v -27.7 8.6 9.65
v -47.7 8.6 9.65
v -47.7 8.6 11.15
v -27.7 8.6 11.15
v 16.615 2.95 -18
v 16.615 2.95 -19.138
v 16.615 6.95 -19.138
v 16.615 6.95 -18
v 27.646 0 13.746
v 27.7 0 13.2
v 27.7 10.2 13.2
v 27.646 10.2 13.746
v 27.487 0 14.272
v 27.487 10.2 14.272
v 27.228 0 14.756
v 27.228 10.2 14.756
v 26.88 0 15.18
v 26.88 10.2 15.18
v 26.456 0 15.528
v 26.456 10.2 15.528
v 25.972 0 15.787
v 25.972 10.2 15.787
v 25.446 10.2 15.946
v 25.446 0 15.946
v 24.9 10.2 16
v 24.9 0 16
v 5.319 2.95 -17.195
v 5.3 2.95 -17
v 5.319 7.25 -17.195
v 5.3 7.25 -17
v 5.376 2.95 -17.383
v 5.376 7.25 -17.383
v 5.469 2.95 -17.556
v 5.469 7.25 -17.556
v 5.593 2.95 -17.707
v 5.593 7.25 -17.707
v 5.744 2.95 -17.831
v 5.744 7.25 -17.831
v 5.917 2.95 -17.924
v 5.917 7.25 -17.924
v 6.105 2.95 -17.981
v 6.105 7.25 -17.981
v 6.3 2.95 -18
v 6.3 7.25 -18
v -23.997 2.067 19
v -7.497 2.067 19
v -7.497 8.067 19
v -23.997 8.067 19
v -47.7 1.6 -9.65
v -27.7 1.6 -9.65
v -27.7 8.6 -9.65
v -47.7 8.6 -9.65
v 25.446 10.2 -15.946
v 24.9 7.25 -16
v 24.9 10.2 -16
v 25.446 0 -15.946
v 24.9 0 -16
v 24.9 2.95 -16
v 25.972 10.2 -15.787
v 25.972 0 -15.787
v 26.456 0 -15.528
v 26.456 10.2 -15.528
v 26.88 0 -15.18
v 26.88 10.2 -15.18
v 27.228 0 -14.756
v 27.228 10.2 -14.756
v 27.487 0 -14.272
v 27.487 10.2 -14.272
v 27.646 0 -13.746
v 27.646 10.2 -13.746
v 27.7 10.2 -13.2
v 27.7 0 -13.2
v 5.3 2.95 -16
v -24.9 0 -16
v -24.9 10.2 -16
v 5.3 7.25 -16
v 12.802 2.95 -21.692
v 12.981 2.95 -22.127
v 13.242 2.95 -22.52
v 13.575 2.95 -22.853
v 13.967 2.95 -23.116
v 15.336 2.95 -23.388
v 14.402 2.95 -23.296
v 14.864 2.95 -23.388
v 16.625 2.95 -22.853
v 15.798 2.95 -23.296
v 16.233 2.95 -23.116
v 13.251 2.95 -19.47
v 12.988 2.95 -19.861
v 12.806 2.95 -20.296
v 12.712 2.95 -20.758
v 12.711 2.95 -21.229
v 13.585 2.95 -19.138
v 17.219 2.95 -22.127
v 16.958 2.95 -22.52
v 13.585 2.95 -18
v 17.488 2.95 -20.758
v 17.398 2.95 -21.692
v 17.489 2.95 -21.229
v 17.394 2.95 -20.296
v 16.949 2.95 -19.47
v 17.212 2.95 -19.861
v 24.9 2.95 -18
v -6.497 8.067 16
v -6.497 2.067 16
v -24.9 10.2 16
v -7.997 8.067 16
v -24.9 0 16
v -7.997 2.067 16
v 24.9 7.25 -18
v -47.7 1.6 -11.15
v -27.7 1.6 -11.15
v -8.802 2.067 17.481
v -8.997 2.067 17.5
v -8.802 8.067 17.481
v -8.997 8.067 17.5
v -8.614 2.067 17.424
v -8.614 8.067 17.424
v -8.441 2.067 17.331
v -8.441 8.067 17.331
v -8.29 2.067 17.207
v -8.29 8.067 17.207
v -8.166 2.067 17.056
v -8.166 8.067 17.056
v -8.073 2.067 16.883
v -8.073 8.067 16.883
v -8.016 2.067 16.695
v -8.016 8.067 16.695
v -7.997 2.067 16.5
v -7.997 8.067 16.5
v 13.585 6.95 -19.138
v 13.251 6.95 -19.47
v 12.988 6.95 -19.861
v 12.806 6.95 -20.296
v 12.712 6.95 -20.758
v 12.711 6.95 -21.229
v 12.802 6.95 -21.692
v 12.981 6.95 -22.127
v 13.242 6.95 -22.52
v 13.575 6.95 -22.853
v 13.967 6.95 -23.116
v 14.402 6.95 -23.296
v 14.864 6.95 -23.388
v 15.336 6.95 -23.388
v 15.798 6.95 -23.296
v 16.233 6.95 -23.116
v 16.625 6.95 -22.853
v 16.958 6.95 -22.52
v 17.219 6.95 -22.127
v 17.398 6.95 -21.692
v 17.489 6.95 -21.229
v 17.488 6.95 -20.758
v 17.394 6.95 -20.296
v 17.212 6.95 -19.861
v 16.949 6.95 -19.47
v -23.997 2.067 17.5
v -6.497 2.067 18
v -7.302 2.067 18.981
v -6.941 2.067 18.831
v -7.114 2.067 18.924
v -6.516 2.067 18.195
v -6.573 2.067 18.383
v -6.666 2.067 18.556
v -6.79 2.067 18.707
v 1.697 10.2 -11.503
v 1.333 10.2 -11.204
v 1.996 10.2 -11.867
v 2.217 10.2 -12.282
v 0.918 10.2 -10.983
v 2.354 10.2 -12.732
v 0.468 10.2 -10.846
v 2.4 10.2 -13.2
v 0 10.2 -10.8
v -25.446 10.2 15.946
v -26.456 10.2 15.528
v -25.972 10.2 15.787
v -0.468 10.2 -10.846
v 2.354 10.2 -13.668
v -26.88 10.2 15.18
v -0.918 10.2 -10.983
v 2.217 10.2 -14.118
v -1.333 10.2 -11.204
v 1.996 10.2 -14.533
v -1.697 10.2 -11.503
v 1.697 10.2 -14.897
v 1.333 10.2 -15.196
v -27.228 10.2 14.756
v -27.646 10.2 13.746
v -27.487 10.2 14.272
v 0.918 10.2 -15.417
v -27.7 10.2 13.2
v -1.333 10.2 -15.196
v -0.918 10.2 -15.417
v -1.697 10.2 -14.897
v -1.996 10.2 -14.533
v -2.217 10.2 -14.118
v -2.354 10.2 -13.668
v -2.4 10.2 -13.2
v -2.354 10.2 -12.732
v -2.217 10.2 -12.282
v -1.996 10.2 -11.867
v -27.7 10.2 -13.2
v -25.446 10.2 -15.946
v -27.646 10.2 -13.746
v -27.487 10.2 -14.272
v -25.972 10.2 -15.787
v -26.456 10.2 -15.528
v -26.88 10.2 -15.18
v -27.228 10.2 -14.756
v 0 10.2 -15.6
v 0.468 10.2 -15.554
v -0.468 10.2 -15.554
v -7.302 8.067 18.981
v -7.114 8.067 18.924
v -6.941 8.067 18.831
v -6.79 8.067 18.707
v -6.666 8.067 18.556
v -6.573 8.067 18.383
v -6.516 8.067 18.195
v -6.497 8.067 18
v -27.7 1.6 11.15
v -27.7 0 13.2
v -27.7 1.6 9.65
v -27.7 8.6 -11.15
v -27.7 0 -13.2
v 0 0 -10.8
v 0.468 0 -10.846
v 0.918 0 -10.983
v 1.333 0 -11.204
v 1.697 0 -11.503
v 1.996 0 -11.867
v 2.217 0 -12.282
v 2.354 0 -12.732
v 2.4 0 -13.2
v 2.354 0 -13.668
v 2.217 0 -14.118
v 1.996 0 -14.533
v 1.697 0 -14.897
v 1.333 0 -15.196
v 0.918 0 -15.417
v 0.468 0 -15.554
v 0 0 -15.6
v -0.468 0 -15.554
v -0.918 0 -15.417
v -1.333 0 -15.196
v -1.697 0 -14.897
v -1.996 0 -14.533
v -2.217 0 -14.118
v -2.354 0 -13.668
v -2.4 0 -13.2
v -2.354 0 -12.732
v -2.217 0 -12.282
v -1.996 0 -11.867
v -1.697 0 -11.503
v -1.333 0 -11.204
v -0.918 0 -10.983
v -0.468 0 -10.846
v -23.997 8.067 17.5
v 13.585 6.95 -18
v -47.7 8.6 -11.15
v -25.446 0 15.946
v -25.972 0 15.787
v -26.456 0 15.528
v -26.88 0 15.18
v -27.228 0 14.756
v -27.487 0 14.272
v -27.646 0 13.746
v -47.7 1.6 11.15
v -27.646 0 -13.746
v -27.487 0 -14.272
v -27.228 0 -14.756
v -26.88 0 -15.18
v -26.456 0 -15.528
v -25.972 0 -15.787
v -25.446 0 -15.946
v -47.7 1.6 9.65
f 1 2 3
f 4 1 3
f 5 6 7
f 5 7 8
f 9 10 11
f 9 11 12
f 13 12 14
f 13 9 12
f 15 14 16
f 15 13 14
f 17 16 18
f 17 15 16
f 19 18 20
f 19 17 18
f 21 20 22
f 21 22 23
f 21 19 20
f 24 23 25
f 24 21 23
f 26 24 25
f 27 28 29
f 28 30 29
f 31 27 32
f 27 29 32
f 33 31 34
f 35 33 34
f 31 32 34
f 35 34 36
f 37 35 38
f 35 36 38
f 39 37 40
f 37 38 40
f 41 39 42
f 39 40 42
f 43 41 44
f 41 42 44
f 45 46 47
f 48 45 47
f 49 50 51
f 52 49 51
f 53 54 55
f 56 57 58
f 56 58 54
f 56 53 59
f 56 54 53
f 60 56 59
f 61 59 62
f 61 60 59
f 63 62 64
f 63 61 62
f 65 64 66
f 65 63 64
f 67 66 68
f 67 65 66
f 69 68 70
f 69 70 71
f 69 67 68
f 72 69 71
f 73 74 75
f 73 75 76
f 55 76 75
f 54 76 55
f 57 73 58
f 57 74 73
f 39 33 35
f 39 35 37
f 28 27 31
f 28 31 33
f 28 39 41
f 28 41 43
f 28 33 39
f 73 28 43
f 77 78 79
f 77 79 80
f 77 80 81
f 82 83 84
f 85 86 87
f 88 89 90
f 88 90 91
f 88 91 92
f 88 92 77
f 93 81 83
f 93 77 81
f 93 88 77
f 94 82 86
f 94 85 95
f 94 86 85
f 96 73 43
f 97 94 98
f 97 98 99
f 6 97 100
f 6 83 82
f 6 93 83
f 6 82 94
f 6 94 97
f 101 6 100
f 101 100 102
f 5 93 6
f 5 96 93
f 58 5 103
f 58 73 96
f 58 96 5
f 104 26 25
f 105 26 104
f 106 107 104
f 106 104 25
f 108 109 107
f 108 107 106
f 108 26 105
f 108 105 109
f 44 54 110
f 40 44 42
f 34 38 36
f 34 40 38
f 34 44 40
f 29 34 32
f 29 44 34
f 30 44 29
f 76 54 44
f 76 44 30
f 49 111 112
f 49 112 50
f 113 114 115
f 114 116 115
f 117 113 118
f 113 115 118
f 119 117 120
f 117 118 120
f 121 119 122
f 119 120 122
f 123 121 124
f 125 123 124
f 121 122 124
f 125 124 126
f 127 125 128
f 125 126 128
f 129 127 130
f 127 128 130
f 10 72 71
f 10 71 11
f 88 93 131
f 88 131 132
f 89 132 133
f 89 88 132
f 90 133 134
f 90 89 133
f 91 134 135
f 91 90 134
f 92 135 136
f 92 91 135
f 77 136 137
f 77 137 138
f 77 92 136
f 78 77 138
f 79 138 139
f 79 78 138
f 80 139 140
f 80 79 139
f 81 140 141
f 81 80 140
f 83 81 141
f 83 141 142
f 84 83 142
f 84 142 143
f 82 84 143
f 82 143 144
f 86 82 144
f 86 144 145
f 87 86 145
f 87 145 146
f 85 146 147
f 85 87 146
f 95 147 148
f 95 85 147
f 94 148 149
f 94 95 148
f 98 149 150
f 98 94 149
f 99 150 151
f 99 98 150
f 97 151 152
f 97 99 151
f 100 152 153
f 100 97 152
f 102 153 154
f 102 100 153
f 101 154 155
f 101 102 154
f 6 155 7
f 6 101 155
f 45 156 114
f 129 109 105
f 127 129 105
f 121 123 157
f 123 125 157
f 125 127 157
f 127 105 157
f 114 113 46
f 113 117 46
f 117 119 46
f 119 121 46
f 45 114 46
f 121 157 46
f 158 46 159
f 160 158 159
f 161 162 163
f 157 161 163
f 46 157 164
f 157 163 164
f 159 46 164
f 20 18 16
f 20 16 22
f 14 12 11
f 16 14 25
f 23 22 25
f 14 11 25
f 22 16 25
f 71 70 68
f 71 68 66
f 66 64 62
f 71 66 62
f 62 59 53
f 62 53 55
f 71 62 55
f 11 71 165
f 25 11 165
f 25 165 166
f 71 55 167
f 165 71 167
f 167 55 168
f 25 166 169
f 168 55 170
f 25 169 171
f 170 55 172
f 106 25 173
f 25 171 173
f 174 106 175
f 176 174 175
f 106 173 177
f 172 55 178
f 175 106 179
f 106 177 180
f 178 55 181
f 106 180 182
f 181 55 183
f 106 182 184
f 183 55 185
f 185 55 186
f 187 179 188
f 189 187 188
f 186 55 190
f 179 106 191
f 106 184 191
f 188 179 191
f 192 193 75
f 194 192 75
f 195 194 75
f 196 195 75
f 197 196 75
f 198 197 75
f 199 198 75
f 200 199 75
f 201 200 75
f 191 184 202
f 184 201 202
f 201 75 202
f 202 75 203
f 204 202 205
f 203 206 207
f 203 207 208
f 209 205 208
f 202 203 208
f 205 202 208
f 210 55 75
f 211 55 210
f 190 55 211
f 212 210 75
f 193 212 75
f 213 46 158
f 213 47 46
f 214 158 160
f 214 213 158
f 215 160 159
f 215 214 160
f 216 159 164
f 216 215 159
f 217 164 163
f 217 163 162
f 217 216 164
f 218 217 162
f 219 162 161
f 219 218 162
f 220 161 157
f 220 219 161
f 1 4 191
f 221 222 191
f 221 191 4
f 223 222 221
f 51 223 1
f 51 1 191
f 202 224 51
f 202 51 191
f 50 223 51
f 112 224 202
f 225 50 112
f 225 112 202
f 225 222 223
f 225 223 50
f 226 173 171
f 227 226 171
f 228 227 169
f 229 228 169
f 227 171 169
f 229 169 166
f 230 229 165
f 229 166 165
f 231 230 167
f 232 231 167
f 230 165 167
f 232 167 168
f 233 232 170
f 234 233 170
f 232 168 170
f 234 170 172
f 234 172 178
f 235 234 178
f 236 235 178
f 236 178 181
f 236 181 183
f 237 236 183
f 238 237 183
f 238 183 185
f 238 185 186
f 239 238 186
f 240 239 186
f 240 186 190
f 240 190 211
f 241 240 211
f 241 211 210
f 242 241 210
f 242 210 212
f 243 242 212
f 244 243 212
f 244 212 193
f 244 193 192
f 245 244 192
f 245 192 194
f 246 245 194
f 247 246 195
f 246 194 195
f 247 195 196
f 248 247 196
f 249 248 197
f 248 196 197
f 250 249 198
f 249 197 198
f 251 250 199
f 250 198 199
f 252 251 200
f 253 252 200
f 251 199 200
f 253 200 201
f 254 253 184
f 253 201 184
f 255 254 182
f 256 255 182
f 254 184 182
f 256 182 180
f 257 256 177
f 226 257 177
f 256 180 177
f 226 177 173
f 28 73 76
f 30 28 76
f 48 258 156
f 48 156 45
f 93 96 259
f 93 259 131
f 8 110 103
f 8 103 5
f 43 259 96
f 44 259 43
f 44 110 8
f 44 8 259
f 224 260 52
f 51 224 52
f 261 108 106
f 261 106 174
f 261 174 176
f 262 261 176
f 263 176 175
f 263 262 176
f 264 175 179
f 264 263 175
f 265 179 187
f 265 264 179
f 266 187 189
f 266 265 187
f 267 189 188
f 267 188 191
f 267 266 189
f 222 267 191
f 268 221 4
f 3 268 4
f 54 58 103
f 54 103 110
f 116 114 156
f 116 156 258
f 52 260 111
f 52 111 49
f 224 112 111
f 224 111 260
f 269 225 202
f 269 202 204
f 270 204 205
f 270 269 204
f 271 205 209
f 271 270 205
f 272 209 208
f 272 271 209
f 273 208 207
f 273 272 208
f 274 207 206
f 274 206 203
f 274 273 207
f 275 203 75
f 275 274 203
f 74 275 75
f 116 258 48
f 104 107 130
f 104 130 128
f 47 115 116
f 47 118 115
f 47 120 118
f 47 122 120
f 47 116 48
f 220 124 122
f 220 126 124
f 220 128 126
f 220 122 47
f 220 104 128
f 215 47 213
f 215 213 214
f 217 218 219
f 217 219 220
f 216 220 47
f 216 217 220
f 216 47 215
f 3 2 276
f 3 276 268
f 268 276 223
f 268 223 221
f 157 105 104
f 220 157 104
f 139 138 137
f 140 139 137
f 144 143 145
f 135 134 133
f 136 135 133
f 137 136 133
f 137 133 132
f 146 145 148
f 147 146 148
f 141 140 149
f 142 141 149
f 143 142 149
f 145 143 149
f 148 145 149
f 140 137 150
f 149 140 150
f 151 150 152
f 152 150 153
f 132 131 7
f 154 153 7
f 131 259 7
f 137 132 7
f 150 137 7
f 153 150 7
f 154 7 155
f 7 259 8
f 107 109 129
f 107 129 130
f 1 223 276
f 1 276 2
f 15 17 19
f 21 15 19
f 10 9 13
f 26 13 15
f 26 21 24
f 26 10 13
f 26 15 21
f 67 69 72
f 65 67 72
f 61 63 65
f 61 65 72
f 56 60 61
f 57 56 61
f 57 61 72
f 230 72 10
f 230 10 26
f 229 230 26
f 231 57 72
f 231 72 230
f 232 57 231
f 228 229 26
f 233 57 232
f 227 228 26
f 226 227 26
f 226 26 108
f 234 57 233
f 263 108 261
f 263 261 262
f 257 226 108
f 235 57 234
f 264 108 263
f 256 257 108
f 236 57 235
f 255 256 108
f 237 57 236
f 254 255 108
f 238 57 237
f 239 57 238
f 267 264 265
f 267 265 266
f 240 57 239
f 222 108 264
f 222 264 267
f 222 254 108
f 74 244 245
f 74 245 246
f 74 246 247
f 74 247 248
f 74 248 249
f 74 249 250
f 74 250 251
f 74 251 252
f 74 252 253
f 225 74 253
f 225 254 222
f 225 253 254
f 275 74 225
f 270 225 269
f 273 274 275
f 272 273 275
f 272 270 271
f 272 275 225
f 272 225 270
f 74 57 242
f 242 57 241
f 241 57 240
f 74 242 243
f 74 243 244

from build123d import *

# Parameters (mm, degrees)
BOSS_EXTRUDE2_DEPTH  = 10.2
SKETCH3_W            = 19.6
SKETCH3_H            = 4.3
BOSS_EXTRUDE3_DEPTH  = 2
FILLET3_R            = 1
SKETCH4_W            = 1.5
SKETCH4_H            = 7
BOSS_EXTRUDE4_DEPTH  = 20
SKETCH5_W            = 1.5
SKETCH5_H            = 7
BOSS_EXTRUDE5_DEPTH  = 20
SKETCH6_W            = 1.5
SKETCH6_H            = 6
BOSS_EXTRUDE7_DEPTH  = 3
SKETCH8_W            = 1.5
SKETCH8_H            = 6
BOSS_EXTRUDE8_DEPTH  = 16
FILLET4_R            = 1
FILLET5_R            = 1
BOSS_EXTRUDE10_DEPTH = 4
SKETCH12_R           = 2.4
CUT_EXTRUDE1_DEPTH   = 19


with BuildPart() as part:
    # Sketch1 → Boss-Extrude2 (new body)
    with BuildSketch(Plane(origin=(0, 0, 0), x_dir=(1, 0, 0), z_dir=(0, 1, 0))):
        with BuildLine():
            Line((-24.9, 16), (24.9, 16))
            ThreePointArc((24.9, 16), (26.879898987, 15.179898987), (27.7, 13.2))
            Line((27.7, 13.2), (27.7, -13.2))
            ThreePointArc((27.7, -13.2), (26.879898987, -15.179898987), (24.9, -16))
            Line((24.9, -16), (-24.9, -16))
            ThreePointArc((-24.9, -16), (-26.879898987, -15.179898987), (-27.7, -13.2))
            Line((-27.7, -13.2), (-27.7, 13.2))
            ThreePointArc((-27.7, 13.2), (-26.879898987, 15.179898987), (-24.9, 16))
        make_face()
    extrude(amount=BOSS_EXTRUDE2_DEPTH)

    # Sketch3 → Boss-Extrude3 (add)
    with BuildSketch(Plane(origin=(0, 0, -16), x_dir=(-1, 0, 0), z_dir=(0, 0, -1))):
        with Locations((-15.1, 5.1)):
            Rectangle(SKETCH3_W, SKETCH3_H)
    extrude(amount=BOSS_EXTRUDE3_DEPTH)

    # Fillet3
    fillet3_edges = [part.edges().sort_by_distance(p)[0] for p in [
        (5.3, 5.1, -18),
    ]]
    fillet(fillet3_edges, radius=FILLET3_R)

    # Sketch4 → Boss-Extrude4 (add)
    with BuildSketch(Plane.ZY.offset(27.7)):
        with Locations((-10.4, 5.1)):
            Rectangle(SKETCH4_W, SKETCH4_H)
    extrude(amount=BOSS_EXTRUDE4_DEPTH)

    # Sketch5 → Boss-Extrude5 (add)
    with BuildSketch(Plane.ZY.offset(27.7)):
        with Locations((10.4, 5.1)):
            Rectangle(SKETCH5_W, SKETCH5_H)
    extrude(amount=BOSS_EXTRUDE5_DEPTH)

    # Sketch6 → Boss-Extrude7 (add)
    with BuildSketch(Plane.XY.offset(16)):
        with Locations((-7.247043242, 5.066819201)):
            Rectangle(SKETCH6_W, SKETCH6_H)
    extrude(amount=BOSS_EXTRUDE7_DEPTH)

    # Sketch8 → Boss-Extrude8 (add)
    with BuildSketch(Plane.ZY.offset(7.997043242)):
        with Locations((18.25, 5.066819201)):
            Rectangle(SKETCH8_W, SKETCH8_H)
    extrude(amount=BOSS_EXTRUDE8_DEPTH)

    # Fillet4
    fillet4_edges = [part.edges().sort_by_distance(p)[0] for p in [
        (-7.997043242, 5.066819201, 17.5),
    ]]
    fillet(fillet4_edges, radius=FILLET4_R)

    # Fillet5
    fillet5_edges = [part.edges().sort_by_distance(p)[0] for p in [
        (-6.497043242, 5.066819201, 19),
    ]]
    fillet(fillet5_edges, radius=FILLET5_R)

    # Sketch11 → Boss-Extrude10 (add)
    with BuildSketch(Plane.XZ.offset(-2.95)):
        with BuildLine():
            Line((16.614530509, -19.138227367), (16.614530509, -16))
            Line((16.614530509, -16), (13.585469491, -16))
            Line((13.585469491, -16), (13.585469491, -19.138227367))
            ThreePointArc((13.585469491, -19.138227367), (15.1, -23.4), (16.614530509, -19.138227367))
        make_face()
    extrude(amount=-BOSS_EXTRUDE10_DEPTH)

    # Sketch12 → Cut-Extrude1 (cut)
    with BuildSketch(Plane(origin=(0, 10.2, 0), x_dir=(1, 0, 0), z_dir=(0, 1, 0))):
        with Locations(Location((0, 13.2, 0), (0, 0, 270))):
            Circle(SKETCH12_R)
    extrude(amount=-CUT_EXTRUDE1_DEPTH, mode=Mode.SUBTRACT)


solid = part.part
